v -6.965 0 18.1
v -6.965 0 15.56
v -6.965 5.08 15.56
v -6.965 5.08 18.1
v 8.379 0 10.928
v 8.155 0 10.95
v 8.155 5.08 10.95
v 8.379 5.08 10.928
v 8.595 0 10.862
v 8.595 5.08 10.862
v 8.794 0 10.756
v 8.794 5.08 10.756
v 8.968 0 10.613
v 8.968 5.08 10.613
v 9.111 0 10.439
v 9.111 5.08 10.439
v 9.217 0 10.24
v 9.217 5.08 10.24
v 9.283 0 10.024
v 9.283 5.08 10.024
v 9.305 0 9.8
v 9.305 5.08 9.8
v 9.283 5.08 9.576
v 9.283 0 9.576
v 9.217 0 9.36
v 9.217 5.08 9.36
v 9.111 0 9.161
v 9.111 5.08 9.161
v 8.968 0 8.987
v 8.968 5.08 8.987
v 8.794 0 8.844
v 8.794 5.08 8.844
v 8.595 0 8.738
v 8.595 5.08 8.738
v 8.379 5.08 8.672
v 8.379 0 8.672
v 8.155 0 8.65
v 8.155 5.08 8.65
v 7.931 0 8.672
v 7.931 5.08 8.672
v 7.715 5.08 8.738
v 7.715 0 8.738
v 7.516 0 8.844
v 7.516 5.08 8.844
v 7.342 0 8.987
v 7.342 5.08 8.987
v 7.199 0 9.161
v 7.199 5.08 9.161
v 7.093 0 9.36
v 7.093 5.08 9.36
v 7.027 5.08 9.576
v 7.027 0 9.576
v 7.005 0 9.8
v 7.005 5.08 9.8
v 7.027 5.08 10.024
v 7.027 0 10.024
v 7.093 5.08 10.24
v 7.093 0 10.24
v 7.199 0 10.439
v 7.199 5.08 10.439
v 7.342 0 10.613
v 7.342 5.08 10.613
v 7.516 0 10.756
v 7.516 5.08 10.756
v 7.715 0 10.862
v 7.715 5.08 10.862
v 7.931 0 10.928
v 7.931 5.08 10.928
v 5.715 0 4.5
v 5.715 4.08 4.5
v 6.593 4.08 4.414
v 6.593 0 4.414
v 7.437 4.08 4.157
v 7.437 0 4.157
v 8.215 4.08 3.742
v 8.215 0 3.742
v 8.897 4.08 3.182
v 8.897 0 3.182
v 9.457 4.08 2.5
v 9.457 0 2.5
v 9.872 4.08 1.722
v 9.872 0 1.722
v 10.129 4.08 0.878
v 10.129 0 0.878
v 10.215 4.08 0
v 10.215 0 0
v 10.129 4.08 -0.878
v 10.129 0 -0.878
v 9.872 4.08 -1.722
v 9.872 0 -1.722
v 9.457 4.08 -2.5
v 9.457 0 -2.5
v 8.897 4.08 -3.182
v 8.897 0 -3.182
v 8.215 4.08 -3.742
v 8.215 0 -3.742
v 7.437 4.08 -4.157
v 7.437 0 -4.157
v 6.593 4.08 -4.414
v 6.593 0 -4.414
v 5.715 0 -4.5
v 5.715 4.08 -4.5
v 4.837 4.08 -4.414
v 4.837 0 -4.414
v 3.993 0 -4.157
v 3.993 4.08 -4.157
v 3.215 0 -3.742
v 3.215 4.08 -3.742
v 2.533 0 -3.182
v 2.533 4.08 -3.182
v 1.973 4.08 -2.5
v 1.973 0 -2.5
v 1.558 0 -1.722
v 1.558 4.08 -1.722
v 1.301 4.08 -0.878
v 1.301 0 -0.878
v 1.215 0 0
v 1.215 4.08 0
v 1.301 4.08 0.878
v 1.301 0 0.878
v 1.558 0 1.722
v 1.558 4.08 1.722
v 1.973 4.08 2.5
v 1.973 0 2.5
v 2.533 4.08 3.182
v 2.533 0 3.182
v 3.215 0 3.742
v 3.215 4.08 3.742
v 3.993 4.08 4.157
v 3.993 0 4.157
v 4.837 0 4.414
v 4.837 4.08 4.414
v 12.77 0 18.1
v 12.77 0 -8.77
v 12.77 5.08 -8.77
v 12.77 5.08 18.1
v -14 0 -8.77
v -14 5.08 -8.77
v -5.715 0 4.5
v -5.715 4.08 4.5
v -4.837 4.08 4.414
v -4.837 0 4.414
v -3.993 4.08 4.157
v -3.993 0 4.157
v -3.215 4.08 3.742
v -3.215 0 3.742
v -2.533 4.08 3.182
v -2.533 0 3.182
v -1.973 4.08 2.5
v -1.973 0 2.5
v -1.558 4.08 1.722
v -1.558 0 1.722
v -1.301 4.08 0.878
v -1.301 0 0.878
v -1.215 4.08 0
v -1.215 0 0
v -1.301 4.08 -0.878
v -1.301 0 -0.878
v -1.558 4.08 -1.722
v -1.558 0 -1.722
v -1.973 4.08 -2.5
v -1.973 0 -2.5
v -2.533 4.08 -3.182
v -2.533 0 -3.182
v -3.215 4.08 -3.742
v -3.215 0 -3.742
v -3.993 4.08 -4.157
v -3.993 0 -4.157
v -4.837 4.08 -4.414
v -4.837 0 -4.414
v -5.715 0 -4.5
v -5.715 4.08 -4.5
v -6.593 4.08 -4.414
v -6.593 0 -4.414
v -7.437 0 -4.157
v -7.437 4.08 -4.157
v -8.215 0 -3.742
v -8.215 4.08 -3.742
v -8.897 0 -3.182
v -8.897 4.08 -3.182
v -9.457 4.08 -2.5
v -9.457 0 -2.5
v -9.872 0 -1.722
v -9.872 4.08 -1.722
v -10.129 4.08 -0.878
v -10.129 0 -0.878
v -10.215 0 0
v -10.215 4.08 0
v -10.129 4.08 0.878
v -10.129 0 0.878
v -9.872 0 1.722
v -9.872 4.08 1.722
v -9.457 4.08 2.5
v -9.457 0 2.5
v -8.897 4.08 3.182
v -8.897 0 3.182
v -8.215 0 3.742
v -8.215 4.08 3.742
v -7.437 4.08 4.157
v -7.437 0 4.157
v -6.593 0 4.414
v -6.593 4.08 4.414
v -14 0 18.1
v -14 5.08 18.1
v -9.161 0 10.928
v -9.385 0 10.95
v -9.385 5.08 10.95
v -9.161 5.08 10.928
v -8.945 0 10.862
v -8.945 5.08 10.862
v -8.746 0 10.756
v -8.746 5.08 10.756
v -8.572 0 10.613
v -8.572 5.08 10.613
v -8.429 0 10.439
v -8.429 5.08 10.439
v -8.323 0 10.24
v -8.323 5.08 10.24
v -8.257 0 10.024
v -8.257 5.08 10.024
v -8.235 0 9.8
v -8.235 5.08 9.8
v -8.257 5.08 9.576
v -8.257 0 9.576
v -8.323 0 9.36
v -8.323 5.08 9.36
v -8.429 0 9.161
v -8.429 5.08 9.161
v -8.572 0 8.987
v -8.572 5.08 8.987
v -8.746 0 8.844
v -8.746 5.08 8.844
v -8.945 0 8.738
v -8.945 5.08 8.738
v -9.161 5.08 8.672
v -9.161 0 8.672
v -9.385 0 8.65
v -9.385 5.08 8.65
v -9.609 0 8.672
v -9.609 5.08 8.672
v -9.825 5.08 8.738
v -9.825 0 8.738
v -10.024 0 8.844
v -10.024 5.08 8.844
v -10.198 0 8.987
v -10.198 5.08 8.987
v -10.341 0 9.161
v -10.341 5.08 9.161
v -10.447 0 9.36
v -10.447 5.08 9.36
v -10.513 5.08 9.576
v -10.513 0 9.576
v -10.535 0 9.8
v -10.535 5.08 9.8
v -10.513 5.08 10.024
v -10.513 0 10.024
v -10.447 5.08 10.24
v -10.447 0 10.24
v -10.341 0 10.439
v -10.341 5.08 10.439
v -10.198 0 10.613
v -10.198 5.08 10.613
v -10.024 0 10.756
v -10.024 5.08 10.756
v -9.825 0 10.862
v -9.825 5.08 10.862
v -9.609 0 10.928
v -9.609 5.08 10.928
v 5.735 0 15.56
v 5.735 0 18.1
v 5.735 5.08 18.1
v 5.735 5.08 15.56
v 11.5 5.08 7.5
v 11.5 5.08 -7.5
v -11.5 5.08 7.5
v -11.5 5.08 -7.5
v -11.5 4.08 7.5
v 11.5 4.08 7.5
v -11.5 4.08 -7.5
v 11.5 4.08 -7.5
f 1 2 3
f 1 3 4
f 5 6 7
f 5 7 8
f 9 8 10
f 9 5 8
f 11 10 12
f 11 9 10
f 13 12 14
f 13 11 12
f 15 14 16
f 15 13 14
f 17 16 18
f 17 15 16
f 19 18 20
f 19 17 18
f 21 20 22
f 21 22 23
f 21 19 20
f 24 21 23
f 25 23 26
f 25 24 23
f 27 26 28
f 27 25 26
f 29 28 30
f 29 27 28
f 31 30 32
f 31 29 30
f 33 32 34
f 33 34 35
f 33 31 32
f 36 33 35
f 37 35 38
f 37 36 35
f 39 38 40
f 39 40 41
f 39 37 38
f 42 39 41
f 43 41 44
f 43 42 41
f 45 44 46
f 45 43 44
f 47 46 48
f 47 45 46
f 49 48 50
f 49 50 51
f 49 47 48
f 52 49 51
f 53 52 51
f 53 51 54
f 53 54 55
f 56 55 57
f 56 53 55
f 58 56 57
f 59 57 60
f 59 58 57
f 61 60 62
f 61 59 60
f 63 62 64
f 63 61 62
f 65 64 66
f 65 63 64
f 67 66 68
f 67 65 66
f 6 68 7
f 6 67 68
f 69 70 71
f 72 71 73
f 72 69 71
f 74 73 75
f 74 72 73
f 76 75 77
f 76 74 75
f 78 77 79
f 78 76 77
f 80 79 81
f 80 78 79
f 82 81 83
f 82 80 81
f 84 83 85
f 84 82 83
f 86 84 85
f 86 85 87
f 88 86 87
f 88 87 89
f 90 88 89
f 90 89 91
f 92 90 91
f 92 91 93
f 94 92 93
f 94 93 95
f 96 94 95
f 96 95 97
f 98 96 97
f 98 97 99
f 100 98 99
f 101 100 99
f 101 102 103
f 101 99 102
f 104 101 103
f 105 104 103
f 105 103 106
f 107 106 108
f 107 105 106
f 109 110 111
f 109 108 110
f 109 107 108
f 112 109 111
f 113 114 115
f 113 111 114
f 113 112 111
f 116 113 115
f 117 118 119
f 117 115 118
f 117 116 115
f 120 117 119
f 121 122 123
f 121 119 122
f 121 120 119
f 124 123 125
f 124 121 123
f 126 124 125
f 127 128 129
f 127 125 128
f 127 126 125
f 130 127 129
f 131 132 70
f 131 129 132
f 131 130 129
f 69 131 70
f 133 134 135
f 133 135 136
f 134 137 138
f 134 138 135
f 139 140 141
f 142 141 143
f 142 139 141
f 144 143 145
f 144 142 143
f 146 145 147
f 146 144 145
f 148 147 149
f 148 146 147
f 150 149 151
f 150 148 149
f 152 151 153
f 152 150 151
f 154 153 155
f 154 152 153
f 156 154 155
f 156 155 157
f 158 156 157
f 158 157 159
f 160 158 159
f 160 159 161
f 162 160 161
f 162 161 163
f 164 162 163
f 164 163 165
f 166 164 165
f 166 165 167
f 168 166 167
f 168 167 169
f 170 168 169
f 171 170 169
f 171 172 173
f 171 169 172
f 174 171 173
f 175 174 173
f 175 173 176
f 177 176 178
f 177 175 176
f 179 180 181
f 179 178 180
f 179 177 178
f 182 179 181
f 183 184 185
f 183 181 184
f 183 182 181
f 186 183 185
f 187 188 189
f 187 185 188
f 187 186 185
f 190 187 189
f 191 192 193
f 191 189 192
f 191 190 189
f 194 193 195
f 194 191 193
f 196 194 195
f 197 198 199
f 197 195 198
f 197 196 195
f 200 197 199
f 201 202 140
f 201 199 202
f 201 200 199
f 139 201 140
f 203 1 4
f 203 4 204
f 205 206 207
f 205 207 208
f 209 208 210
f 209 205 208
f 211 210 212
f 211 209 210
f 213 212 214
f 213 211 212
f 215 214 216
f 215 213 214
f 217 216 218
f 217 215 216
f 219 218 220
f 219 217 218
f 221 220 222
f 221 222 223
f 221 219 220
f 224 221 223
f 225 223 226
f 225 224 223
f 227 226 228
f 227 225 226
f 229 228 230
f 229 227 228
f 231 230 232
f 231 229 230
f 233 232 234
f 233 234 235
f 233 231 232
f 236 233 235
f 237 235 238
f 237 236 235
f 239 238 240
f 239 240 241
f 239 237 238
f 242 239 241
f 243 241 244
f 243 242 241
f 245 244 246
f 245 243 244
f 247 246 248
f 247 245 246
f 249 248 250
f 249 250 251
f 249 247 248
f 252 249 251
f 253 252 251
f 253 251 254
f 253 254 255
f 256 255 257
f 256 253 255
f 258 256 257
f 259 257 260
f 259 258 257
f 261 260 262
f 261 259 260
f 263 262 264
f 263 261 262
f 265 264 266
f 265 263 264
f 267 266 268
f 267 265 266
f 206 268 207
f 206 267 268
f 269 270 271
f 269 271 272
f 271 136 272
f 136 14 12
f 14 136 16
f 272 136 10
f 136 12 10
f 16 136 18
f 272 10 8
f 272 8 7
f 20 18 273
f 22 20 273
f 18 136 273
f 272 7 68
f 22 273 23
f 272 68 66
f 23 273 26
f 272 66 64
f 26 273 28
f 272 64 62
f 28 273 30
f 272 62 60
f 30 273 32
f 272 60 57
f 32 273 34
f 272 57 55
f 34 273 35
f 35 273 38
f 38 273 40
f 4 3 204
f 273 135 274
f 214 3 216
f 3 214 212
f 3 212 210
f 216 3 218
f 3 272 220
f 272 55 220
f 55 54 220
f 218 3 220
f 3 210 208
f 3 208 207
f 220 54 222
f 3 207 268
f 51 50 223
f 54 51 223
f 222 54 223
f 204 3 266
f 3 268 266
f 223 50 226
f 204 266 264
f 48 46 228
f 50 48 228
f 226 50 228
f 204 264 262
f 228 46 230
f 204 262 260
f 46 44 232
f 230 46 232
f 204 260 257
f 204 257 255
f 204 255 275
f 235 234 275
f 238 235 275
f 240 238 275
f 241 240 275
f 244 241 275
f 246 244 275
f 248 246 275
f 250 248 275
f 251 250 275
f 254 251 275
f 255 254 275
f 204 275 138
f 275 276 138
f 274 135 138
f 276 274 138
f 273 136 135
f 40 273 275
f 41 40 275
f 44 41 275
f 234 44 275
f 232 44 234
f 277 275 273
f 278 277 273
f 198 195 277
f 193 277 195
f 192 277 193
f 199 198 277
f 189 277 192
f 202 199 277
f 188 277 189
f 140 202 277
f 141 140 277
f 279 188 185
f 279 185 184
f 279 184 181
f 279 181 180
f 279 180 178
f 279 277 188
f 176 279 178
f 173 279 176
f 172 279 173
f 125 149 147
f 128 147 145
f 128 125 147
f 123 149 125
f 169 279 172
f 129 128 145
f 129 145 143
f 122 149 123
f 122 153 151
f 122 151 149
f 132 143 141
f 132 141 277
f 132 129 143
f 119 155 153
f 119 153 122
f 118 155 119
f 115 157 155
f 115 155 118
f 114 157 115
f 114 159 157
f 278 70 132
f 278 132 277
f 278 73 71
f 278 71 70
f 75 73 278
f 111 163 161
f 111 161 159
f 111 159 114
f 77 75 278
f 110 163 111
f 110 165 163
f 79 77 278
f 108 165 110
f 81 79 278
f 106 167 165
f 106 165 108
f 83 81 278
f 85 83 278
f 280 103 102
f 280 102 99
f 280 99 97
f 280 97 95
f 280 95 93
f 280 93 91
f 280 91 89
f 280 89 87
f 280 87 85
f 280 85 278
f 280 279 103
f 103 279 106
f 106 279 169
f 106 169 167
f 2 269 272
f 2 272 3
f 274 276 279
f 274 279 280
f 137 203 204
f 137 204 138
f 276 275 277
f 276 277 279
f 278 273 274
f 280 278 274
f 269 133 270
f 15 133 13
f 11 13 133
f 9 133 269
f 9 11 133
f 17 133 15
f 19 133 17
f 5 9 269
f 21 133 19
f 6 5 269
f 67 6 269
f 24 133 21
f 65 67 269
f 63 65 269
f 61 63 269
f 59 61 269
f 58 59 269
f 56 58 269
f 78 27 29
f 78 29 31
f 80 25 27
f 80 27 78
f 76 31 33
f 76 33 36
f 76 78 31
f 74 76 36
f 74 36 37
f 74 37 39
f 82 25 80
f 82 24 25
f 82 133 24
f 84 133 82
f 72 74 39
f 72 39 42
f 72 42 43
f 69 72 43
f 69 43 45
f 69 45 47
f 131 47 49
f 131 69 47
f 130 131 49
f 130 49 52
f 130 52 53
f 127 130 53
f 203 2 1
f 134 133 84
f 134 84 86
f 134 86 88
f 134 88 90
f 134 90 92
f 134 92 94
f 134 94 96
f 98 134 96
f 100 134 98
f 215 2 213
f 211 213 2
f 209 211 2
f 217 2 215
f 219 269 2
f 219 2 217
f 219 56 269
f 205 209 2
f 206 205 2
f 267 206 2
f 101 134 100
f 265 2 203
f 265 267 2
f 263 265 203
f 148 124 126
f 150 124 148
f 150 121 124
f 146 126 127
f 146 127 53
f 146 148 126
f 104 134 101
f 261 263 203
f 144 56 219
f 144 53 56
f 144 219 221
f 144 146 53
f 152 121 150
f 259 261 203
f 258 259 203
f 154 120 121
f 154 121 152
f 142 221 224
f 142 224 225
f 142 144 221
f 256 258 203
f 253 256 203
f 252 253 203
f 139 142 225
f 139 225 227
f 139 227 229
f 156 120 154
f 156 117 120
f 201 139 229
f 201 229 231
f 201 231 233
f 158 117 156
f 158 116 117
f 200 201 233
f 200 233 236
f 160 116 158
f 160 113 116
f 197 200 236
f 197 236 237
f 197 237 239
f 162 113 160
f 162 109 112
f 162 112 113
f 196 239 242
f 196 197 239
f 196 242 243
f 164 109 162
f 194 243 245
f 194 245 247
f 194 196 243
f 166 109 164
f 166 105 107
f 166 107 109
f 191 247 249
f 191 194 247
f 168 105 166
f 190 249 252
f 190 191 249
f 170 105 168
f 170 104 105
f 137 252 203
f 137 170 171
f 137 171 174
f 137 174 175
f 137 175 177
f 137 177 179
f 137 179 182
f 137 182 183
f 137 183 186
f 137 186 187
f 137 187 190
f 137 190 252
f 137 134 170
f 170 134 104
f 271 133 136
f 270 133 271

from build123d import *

# Parameters (mm, degrees)
SKETCH1_R           = 4.5
SKETCH1_R_2         = 1.15
BOSS_EXTRUDE1_DEPTH = 5.08
SKETCH4_W           = 23
SKETCH4_H           = 15
CUT_EXTRUDE1_DEPTH  = 1


with BuildPart() as part:
    # Sketch1 → Boss-Extrude1 (new body)
    with BuildSketch(Plane(origin=(0, 0, 0), x_dir=(1, 0, 0), z_dir=(0, 1, 0))):
        Polygon((-14, 8.77), (12.77, 8.77), (12.77, -18.1), (5.735, -18.1), (5.735, -15.56), (-6.965, -15.56), (-6.965, -18.1), (-14, -18.1), align=None)
        with Locations(Location((-5.715, 0, 0), (0, 0, 270))):
            Circle(SKETCH1_R, mode=Mode.SUBTRACT)
        with Locations(Location((5.715, 0, 0), (0, 0, 270))):
            Circle(SKETCH1_R, mode=Mode.SUBTRACT)
        with Locations(Location((-9.384999986, -9.8, 0), (0, 0, 270))):
            Circle(SKETCH1_R_2, mode=Mode.SUBTRACT)
        with Locations(Location((8.154999986, -9.8, 0), (0, 0, 270))):
            Circle(SKETCH1_R_2, mode=Mode.SUBTRACT)
    extrude(amount=BOSS_EXTRUDE1_DEPTH)

    # Sketch4 → Cut-Extrude1 (cut)
    with BuildSketch(Plane(origin=(0, 5.08, 0), x_dir=(1, 0, 0), z_dir=(0, 1, 0))):
        Rectangle(SKETCH4_W, SKETCH4_H)
    extrude(amount=-CUT_EXTRUDE1_DEPTH, mode=Mode.SUBTRACT)


solid = part.part
